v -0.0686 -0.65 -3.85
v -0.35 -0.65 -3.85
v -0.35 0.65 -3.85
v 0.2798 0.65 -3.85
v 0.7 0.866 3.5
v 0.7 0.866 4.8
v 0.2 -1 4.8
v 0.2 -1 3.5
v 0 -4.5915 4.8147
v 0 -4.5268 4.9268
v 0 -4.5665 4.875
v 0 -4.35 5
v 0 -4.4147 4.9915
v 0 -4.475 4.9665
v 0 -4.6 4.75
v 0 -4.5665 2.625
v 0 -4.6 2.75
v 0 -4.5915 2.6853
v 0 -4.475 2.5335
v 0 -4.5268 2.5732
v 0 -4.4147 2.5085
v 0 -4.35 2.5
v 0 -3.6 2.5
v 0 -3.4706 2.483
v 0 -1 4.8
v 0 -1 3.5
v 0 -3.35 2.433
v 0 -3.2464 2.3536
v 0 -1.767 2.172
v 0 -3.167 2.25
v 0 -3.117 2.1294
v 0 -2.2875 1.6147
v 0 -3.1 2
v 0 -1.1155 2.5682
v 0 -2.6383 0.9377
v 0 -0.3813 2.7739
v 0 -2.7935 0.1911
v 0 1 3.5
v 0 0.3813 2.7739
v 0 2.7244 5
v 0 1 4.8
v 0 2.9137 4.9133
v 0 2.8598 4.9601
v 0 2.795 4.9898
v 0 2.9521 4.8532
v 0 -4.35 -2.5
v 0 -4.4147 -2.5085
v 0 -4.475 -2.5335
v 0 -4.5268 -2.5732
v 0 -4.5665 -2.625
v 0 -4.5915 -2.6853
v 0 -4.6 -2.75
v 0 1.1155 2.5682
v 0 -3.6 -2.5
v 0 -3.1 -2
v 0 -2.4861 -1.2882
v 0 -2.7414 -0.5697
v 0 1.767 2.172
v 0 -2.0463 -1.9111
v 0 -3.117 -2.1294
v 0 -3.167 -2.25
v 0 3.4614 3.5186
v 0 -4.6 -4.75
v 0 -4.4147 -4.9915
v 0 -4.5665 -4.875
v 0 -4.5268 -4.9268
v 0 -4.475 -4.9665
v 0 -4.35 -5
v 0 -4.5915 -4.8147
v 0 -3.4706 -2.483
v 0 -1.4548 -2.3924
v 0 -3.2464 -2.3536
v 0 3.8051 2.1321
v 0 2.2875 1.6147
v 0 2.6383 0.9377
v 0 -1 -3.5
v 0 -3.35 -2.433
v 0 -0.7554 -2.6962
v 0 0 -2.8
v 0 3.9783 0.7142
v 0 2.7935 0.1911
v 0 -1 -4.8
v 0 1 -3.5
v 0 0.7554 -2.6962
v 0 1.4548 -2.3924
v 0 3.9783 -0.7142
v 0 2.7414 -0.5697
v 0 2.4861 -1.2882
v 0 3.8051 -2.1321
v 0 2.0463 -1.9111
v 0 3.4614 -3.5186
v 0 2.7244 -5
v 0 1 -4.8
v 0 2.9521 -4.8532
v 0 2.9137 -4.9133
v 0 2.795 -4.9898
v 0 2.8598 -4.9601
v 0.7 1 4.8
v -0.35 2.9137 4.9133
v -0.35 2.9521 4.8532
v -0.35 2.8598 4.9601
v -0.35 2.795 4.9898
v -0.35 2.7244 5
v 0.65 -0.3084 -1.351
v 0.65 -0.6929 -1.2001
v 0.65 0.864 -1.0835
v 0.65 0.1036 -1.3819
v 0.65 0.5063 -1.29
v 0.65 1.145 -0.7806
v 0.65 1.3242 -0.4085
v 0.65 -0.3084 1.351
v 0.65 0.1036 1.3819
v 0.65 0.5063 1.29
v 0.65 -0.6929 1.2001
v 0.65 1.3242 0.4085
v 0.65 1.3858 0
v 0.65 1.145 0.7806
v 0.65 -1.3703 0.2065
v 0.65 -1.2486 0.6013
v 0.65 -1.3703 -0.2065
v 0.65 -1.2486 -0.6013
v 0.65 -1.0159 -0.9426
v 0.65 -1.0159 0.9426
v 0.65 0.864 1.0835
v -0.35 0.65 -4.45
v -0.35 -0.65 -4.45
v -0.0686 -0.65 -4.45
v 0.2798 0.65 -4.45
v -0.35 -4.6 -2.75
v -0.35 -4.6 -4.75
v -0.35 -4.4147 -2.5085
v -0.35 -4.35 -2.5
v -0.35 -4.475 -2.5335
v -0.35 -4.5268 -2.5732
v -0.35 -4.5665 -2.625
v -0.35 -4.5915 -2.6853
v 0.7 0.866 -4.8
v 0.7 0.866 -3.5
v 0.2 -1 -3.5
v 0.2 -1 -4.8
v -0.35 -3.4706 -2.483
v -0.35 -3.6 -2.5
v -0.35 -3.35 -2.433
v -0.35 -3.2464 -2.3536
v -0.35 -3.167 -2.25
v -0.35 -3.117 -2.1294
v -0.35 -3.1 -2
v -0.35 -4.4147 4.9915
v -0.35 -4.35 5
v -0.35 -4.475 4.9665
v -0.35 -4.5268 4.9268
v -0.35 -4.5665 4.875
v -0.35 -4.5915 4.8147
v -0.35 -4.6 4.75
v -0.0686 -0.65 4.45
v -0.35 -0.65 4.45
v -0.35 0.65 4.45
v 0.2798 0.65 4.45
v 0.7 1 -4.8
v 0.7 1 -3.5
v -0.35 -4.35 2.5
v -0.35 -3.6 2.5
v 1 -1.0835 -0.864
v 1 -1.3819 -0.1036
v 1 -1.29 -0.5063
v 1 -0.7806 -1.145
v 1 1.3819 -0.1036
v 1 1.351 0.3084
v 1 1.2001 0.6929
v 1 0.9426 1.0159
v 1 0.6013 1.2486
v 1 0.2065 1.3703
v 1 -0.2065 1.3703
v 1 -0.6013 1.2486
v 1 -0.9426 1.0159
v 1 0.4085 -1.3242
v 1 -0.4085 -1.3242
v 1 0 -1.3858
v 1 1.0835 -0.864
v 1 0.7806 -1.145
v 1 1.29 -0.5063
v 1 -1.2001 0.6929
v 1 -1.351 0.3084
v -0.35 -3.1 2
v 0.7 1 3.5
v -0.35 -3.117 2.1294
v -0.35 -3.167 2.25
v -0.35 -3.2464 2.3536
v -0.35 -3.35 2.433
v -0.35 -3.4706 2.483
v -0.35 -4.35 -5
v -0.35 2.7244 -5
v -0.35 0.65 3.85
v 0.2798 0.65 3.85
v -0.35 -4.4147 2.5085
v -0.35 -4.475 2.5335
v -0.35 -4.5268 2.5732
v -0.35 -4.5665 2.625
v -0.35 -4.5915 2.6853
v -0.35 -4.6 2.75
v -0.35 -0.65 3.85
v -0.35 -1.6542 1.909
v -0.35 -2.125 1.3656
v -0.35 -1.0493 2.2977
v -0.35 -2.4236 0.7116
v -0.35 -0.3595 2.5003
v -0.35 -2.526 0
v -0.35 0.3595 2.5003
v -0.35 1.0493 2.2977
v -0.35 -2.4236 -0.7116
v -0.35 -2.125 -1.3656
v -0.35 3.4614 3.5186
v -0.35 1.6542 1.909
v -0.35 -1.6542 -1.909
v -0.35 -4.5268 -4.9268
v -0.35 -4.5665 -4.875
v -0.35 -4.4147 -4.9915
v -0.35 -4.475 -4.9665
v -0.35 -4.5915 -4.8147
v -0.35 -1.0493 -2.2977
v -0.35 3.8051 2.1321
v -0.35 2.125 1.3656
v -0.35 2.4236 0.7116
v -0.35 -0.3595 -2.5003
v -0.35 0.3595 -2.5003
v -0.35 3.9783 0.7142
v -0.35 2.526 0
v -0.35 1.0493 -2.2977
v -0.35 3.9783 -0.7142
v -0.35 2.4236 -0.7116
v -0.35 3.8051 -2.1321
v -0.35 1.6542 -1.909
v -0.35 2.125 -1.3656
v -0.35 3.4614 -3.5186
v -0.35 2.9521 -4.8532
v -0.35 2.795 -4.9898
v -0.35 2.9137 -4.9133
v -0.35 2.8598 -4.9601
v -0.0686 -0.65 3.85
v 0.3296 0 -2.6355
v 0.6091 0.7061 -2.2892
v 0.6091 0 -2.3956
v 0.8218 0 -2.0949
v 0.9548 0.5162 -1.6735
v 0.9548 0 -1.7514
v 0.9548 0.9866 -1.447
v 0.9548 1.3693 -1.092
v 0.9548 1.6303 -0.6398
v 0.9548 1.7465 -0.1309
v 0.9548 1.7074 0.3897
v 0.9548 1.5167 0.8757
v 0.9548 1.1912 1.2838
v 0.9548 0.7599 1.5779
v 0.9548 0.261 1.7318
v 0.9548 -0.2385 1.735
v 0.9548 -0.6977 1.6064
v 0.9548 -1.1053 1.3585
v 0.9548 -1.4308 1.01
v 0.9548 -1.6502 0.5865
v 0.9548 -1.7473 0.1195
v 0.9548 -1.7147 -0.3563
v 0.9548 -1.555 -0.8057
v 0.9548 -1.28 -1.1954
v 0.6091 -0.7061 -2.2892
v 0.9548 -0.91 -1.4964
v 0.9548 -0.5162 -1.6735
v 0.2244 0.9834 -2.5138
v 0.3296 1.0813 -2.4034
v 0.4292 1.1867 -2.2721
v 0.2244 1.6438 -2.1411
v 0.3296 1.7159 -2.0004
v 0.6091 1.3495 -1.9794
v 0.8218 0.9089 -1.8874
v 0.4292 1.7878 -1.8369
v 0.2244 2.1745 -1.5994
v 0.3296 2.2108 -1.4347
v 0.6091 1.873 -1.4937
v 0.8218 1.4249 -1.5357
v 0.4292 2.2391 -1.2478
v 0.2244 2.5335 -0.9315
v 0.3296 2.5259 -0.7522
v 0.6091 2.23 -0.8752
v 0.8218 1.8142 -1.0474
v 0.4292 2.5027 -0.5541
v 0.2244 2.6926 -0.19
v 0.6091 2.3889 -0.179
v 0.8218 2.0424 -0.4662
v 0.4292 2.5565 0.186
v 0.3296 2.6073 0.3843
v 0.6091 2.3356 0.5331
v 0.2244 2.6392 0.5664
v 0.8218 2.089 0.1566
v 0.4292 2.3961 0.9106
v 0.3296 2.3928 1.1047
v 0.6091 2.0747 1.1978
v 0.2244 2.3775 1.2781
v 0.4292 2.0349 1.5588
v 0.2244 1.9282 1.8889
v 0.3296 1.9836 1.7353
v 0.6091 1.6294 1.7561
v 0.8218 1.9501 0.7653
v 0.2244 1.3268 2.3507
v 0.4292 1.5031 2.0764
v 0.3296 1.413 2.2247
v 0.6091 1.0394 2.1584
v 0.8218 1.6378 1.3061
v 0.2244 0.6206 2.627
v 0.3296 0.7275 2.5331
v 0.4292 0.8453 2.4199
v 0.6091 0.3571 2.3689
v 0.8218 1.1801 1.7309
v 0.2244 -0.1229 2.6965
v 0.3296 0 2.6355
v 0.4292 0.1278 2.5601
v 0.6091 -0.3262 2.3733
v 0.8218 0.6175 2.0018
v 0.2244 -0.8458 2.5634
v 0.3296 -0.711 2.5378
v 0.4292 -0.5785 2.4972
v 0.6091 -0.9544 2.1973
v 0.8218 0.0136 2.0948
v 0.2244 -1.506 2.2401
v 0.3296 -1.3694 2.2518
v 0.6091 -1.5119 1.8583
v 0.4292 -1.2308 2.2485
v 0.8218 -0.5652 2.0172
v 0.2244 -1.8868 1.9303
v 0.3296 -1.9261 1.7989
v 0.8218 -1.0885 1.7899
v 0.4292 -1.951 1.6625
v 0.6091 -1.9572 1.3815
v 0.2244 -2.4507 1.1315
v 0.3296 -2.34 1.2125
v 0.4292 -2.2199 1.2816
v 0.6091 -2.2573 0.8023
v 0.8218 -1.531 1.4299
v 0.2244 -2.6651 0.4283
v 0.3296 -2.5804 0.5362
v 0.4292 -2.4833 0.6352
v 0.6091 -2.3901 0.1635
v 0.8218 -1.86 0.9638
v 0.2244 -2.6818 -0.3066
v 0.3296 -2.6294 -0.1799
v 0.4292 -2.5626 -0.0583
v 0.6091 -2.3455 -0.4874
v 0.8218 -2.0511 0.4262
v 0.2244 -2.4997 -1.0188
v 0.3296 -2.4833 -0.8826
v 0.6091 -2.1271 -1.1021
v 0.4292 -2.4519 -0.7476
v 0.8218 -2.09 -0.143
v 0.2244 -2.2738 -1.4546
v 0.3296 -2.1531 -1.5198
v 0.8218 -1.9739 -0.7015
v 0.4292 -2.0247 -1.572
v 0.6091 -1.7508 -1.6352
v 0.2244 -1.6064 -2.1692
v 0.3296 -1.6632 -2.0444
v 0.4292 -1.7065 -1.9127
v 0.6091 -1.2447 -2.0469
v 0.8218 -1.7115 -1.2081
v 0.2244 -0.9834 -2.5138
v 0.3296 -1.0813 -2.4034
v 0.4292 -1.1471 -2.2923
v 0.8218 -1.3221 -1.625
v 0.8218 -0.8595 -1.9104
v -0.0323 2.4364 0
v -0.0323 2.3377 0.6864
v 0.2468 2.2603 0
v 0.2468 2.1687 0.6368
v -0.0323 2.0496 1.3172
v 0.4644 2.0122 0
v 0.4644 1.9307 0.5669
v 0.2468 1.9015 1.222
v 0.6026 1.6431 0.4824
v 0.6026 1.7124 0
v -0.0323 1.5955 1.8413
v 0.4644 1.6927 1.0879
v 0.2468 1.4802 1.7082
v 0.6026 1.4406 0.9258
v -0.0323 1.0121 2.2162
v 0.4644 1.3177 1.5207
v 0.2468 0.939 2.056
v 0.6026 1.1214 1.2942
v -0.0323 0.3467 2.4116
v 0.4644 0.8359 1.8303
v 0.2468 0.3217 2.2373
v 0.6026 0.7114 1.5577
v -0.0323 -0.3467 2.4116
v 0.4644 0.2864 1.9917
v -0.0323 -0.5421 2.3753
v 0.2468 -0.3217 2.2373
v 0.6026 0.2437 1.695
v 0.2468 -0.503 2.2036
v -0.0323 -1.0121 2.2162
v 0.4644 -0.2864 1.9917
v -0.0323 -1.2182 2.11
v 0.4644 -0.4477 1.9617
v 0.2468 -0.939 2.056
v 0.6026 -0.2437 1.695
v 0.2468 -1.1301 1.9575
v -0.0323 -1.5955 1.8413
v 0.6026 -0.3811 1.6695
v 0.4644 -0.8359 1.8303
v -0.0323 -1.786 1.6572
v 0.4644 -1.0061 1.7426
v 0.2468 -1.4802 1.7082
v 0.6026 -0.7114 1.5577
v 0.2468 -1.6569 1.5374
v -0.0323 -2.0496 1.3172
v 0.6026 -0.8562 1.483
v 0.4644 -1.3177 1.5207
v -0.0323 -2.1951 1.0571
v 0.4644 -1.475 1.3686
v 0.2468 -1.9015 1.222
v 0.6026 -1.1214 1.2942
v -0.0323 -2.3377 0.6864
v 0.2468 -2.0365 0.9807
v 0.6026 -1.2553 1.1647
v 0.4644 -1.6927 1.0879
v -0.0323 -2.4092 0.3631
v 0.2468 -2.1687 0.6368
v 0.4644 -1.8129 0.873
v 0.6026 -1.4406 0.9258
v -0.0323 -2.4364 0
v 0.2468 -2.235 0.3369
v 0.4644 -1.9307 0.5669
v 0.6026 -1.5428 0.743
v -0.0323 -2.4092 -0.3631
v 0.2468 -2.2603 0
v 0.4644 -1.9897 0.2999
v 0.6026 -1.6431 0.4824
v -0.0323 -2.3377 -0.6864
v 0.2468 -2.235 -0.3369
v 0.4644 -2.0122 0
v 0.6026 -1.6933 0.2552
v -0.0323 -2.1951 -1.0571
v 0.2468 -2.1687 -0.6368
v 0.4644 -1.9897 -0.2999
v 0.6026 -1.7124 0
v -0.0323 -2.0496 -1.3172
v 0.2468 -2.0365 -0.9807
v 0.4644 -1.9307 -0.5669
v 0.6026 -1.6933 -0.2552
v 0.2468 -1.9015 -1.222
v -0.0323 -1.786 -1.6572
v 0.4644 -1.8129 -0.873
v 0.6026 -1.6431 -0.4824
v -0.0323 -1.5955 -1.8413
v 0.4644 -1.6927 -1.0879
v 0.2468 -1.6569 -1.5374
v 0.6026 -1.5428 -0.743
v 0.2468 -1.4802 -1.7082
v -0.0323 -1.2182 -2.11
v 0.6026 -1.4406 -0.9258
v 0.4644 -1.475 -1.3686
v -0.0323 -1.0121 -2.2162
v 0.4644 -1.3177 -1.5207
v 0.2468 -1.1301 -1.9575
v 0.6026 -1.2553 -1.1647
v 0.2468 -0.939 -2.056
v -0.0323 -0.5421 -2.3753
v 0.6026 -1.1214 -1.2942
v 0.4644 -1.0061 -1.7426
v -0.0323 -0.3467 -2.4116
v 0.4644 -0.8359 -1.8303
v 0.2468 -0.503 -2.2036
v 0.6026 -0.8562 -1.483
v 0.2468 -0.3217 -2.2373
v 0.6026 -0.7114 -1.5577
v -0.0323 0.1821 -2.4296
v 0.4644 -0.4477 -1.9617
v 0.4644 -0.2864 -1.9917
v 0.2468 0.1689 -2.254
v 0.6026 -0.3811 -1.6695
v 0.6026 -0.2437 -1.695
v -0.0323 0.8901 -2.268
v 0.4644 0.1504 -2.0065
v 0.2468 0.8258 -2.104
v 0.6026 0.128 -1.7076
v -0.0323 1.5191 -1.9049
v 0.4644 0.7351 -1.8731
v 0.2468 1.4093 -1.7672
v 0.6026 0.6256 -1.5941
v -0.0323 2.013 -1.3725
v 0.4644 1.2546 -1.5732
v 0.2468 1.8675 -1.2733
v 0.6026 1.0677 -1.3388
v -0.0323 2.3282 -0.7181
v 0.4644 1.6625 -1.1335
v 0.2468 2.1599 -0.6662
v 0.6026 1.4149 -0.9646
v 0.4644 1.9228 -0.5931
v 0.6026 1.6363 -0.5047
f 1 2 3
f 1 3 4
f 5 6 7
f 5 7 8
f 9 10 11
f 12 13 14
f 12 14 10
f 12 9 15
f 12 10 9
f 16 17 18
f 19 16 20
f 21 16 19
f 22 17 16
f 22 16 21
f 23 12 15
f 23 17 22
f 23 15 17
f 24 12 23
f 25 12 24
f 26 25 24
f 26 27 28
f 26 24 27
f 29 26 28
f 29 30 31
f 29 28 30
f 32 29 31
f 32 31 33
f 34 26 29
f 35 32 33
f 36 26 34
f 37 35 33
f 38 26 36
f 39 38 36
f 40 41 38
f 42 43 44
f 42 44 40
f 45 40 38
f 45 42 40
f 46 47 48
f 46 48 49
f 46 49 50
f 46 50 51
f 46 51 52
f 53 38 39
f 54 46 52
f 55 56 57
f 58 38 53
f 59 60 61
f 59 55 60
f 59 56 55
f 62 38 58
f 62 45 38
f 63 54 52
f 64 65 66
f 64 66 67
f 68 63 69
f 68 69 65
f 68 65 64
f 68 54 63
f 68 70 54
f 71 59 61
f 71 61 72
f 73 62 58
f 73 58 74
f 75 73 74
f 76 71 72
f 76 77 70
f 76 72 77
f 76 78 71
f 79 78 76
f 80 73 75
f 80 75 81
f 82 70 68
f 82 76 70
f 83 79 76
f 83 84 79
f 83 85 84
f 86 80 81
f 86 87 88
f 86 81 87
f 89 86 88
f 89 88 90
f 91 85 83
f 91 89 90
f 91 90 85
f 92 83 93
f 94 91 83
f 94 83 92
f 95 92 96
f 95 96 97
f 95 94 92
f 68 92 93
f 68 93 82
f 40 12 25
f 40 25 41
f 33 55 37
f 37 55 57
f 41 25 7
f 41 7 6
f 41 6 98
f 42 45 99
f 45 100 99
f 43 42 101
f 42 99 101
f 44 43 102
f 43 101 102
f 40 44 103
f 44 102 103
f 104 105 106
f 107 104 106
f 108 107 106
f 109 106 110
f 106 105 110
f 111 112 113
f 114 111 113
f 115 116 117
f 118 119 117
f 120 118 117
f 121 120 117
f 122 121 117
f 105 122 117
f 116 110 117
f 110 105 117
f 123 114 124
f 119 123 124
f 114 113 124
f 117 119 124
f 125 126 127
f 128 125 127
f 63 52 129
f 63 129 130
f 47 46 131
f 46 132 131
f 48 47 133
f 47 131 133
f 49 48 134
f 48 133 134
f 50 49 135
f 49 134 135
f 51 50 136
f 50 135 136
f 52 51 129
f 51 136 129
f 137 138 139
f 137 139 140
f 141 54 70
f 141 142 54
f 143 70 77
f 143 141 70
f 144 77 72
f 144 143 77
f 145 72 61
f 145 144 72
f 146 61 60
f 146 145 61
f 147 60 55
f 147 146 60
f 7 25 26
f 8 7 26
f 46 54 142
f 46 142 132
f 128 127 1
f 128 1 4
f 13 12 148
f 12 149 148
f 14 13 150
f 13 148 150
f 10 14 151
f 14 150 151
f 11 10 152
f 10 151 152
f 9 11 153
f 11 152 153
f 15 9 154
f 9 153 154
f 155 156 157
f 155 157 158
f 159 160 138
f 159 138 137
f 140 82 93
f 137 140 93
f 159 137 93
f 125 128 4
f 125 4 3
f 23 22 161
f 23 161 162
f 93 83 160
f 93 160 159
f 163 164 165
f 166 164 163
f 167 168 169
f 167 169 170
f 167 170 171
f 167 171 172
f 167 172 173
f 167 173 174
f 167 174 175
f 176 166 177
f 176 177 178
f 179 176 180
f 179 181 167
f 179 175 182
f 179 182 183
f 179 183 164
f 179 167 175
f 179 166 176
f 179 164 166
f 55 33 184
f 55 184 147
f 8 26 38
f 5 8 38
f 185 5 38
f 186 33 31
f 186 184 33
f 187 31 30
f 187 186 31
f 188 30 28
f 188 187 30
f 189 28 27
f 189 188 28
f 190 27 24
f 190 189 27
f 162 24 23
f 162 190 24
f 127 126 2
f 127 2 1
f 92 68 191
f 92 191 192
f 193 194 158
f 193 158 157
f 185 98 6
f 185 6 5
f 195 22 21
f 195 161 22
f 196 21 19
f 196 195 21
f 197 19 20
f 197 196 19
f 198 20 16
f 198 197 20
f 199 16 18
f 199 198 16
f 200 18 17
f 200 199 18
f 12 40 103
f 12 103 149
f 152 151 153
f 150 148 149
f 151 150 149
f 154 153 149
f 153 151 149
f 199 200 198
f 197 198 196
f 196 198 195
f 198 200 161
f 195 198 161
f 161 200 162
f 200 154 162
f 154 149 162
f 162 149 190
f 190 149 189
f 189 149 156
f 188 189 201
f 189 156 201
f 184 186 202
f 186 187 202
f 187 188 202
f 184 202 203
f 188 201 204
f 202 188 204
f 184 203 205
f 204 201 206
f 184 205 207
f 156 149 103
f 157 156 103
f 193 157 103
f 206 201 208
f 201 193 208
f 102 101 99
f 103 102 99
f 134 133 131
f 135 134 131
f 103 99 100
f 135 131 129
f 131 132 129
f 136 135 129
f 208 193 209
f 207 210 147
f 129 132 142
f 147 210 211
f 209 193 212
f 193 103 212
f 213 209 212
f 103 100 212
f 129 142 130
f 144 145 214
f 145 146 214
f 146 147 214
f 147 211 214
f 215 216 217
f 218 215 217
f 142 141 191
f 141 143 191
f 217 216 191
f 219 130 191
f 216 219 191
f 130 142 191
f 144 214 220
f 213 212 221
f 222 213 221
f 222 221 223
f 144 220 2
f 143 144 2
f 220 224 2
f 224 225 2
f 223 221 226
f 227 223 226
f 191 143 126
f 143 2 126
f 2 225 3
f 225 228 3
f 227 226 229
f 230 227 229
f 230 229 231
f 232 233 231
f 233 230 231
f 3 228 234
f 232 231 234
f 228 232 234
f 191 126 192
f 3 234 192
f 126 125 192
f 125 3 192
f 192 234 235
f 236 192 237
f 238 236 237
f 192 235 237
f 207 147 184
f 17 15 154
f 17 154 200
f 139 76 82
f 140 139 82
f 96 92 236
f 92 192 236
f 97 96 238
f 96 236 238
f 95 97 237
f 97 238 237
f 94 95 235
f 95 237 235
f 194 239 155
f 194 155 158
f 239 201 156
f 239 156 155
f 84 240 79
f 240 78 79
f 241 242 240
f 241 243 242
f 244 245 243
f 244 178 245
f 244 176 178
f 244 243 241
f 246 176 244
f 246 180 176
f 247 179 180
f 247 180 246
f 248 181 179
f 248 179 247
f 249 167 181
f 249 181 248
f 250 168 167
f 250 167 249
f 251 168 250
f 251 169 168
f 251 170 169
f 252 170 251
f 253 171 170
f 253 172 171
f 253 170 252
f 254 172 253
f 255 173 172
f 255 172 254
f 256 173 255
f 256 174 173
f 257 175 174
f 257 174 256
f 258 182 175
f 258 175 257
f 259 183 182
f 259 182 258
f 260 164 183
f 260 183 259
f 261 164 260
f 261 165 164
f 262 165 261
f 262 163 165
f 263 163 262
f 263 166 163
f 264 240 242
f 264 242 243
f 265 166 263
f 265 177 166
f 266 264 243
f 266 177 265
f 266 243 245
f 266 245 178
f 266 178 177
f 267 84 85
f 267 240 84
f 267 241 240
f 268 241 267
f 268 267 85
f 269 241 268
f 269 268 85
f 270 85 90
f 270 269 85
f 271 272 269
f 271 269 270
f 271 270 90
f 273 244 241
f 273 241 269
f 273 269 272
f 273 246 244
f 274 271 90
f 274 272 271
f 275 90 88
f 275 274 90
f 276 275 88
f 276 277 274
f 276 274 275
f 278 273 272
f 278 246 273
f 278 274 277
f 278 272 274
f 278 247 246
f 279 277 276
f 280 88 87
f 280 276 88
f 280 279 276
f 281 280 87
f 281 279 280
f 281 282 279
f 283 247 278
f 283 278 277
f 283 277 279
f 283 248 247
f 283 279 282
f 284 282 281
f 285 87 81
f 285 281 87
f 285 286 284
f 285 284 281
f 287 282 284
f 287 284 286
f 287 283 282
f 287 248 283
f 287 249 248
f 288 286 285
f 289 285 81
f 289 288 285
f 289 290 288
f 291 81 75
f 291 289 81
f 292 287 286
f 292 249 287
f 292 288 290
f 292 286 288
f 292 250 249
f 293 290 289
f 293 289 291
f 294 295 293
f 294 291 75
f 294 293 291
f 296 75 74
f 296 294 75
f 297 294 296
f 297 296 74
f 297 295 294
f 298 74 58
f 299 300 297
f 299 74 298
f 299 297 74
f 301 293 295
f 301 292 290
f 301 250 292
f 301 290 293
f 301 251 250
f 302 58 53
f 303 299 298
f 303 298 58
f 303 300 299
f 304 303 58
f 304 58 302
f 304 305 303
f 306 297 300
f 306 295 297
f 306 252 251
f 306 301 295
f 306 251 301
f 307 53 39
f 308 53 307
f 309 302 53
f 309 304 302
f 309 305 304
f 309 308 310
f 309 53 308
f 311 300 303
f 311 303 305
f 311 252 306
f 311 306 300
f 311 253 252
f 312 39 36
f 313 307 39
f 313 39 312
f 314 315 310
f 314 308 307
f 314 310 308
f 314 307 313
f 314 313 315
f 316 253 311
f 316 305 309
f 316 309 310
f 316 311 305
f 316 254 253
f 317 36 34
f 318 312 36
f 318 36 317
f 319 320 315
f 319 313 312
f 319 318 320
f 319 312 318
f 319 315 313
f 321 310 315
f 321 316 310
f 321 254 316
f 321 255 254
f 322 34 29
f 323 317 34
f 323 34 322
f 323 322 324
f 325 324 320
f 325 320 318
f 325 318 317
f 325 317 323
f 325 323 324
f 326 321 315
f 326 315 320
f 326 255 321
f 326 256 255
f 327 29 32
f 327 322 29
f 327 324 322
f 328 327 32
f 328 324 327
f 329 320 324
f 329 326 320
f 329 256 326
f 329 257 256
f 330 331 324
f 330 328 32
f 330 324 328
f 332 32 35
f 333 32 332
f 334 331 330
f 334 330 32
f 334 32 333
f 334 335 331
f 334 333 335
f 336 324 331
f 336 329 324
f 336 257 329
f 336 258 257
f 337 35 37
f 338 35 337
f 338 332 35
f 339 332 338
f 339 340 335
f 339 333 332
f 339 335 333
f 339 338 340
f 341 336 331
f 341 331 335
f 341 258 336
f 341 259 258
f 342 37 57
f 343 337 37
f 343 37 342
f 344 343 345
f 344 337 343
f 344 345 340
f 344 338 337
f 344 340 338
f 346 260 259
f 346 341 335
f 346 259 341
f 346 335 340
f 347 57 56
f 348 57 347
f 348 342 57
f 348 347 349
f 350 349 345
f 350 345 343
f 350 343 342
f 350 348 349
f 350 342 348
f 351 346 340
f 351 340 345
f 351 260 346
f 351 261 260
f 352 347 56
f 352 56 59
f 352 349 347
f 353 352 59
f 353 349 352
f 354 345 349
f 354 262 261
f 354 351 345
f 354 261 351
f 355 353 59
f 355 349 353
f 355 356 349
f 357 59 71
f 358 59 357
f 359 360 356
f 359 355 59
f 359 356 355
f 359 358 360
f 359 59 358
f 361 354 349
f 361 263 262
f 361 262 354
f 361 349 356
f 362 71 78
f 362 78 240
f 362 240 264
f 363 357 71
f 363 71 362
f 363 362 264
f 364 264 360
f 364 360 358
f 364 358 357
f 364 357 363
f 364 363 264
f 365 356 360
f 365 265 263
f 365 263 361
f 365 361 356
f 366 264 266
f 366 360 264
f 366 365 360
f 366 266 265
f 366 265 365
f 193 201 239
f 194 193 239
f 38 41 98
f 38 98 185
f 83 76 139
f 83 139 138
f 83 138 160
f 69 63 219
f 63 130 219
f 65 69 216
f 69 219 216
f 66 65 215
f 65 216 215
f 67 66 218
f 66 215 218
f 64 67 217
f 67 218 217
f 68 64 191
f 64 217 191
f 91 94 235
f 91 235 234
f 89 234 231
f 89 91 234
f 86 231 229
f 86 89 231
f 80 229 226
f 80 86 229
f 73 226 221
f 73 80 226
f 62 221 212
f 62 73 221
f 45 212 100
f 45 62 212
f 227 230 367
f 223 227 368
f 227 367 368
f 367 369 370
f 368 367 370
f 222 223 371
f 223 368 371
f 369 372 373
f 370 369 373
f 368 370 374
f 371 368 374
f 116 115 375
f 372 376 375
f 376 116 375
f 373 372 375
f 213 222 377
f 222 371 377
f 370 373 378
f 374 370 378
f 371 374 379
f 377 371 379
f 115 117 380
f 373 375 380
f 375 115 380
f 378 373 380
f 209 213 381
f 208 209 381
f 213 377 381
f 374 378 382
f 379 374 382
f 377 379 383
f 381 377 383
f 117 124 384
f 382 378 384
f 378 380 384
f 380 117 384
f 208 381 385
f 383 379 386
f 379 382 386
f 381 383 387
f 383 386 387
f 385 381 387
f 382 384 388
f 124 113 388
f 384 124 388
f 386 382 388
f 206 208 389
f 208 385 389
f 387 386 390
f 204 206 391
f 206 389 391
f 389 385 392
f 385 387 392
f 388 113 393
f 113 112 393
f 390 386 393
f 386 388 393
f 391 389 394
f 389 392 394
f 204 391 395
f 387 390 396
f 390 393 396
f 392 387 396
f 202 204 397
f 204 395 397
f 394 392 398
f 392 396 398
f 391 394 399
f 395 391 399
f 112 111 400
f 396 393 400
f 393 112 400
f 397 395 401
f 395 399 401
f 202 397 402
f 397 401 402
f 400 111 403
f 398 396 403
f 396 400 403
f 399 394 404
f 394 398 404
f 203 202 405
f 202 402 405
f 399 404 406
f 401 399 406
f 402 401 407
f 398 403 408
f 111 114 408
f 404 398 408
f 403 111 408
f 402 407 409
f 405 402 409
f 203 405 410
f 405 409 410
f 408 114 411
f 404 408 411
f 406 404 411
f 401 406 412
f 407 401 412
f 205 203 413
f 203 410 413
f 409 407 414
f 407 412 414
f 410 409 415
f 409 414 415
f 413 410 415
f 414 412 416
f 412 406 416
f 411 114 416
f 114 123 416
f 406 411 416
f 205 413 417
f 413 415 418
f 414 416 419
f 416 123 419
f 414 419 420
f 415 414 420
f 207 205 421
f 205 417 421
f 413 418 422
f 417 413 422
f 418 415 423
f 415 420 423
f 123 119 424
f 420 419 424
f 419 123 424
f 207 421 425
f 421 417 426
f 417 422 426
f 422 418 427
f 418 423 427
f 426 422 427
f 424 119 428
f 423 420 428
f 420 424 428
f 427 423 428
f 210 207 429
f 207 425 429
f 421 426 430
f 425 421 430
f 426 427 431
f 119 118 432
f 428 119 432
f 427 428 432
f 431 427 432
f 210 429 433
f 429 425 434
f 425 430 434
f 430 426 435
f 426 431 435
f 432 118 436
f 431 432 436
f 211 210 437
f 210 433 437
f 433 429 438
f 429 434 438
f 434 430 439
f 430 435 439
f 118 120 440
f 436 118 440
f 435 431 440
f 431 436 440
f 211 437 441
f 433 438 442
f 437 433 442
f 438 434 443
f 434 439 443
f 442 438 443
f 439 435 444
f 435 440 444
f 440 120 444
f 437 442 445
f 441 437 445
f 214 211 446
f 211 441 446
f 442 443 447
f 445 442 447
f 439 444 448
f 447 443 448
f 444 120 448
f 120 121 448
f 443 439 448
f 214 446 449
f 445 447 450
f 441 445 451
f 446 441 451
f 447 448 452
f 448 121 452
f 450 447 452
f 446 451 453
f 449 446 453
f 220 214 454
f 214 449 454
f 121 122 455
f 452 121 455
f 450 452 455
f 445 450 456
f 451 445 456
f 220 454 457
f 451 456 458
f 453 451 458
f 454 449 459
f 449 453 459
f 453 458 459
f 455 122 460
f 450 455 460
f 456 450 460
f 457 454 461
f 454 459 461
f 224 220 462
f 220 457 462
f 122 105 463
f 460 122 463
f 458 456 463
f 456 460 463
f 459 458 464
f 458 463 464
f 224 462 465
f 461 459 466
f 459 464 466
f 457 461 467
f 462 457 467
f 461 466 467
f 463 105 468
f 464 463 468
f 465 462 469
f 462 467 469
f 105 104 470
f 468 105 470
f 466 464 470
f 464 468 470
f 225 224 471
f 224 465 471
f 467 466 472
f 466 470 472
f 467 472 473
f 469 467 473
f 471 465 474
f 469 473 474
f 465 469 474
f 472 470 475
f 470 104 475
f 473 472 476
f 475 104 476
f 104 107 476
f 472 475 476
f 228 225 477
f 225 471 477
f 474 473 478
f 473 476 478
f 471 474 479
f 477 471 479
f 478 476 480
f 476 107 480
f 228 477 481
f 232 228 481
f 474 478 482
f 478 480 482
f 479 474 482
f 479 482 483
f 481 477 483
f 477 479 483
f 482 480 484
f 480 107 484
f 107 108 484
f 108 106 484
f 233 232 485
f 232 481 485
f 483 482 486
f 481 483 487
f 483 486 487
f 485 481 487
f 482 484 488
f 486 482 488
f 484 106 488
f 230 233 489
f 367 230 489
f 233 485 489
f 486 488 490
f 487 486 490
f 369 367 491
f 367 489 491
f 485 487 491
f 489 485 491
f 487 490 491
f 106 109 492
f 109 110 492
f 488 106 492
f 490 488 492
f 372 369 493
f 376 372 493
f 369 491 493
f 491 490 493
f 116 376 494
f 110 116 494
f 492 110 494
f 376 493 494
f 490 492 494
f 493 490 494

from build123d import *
from OCP.BRepFilletAPI import BRepFilletAPI_MakeChamfer

# Parameters (mm, degrees)
SKETCH1_R           = 2.8
BOSS_EXTRUDE1_DEPTH = 1
BOSS_EXTRUDE2_DEPTH = 0.35
FILLET1_R           = 1.5
SKETCH3_W           = 1.3
SKETCH3_H           = 2
BOSS_EXTRUDE3_DEPTH = 0.7
CHAMFER1_SIZE       = 0.5
CHAMFER1_SIZE2      = 1.866025404
FILLET2_R           = 0.5
FILLET3_R           = 0.25
SHELL3_START        = -4.45
SHELL3_DEPTH        = 0.6
SHELL3_START_2      = 3.85
SHELL3_2_DEPTH      = 0.6


# Read off the part's stored shape, not the designer's step: Shell3
with BuildPart() as part:
    # Sketch1 → Boss-Extrude1 (new body)
    with BuildSketch(Plane(origin=(0, 0, 0), x_dir=(0, 0, -1), z_dir=(1, 0, 0))):
        Circle(SKETCH1_R)
    extrude(amount=BOSS_EXTRUDE1_DEPTH)

    # Sketch2 → Boss-Extrude2 (add)
    with BuildSketch(Plane(origin=(0, 0, 0), x_dir=(0, 0, -1), z_dir=(1, 0, 0))):
        with BuildLine():
            Line((2.5, -4.6), (5, -4.6))
            Line((5, -4.6), (5, 2.495381949))
            Line((5, 2.495381949), (5, 2.884339454))
            ThreePointArc((5, 2.884339454), (0, 4), (-5, 2.884339454))
            Line((-5, 2.884339454), (-5, 2.495381949))
            Line((-5, 2.495381949), (-5, -4.6))
            Line((-5, -4.6), (-2.5, -4.6))
            Line((-2.5, -4.6), (-2.5, -3.1))
            Line((-2.5, -3.1), (2.5, -3.1))
            Line((2.5, -3.1), (2.5, -4.6))
        make_face()
    extrude(amount=-BOSS_EXTRUDE2_DEPTH)

    # Fillet1
    # the kernel refuses this fillet: 1.5 mm, written as the material it takes off along each edge
    with BuildSketch(Plane(origin=(1, 0, 0), x_dir=(0, 0, -1), z_dir=(0, -1, 0))) as fillet1_piece_1:
        with BuildLine():
            CenterArc((1.385786438, -1.5), FILLET1_R, 19.471220634, 70.528779366)
            Line((1.385786438, 0), (1.385786438, 0.03))
            Line((1.385786438, 0.03), (2.8, 0.03))
            Line((2.8, 0.03), (2.83, 0))
            ThreePointArc((2.83, 0), (2.83, -0.5), (2.828284271, -0.99))
            Line((2.828284271, -0.99), (2.8, -1))
        make_face()
    revolve(axis=Axis((1, 0, 0), (1, 0, 0)), mode=Mode.SUBTRACT)

    # Sketch3 → Boss-Extrude3 (add)
    with BuildSketch(Plane(origin=(0, 0, 0), x_dir=(0, 0, -1), z_dir=(1, 0, 0))):
        with Locations((-4.15, 0)):
            Rectangle(SKETCH3_W, SKETCH3_H)
        with Locations((4.15, 0)):
            Rectangle(SKETCH3_W, SKETCH3_H)
    extrude(amount=BOSS_EXTRUDE3_DEPTH)

    # Chamfer1: one chamfer whose edges measure the first distance from different faces: ONE call of the kernel's chamfer builder (chamfer() names one face for all edges)
    chamfer1_edges_1 = [part.edges().sort_by_distance(p)[0] for p in [
        (0.7, -1, 4.15),
    ]]
    chamfer1_side_1 = [part.faces().sort_by_distance(p)[0] for p in [
        (0.35, -1, 4.15),
    ]]
    chamfer1_edges_2 = [part.edges().sort_by_distance(p)[0] for p in [
        (0.7, -1, -4.15),
    ]]
    chamfer1_side_2 = [part.faces().sort_by_distance(p)[0] for p in [
        (0.35, -1, -4.15),
    ]]
    chamfer1 = BRepFilletAPI_MakeChamfer(part.part.solid().wrapped)
    for e in chamfer1_edges_1:
        chamfer1.Add(CHAMFER1_SIZE, CHAMFER1_SIZE2, e.wrapped, chamfer1_side_1[0].wrapped)  # the first distance lies on this face
    for e in chamfer1_edges_2:
        chamfer1.Add(CHAMFER1_SIZE, CHAMFER1_SIZE2, e.wrapped, chamfer1_side_2[0].wrapped)  # the first distance lies on this face
    add(Compound.cast(chamfer1.Shape()), mode=Mode.REPLACE)

    # Fillet2
    fillet2_edges = [part.edges().sort_by_distance(p)[0] for p in [
        (-0.175, -3.1, 2.5),
        (-0.175, -3.1, -2.5),
    ]]
    fillet(fillet2_edges, radius=FILLET2_R)

    # Fillet3
    fillet3_edges = [part.edges().sort_by_distance(p)[0] for p in [
        (-0.175, -4.6, 2.5),
        (-0.175, -4.6, 5),
        (-0.175, 2.884339454, 5),
        (-0.175, 2.884339454, -5),
        (-0.175, -4.6, -5),
        (-0.175, -4.6, -2.5),
    ]]
    fillet(fillet3_edges, radius=FILLET3_R)

    # Shell3 outline → Shell3 (cut)
    with BuildSketch(Plane.XY.offset(SHELL3_START)):
        Polygon((-0.35, -0.65), (-0.068564446, -0.65), (0.279769504, 0.65), (-0.35, 0.65), align=None)
    extrude(amount=SHELL3_DEPTH, mode=Mode.SUBTRACT)

    # Shell3 2 outline → Shell3 2 (cut)
    with BuildSketch(Plane.XY.offset(SHELL3_START_2)):
        Polygon((-0.35, -0.65), (-0.068564446, -0.65), (0.279769504, 0.65), (-0.35, 0.65), align=None)
    extrude(amount=SHELL3_2_DEPTH, mode=Mode.SUBTRACT)

    # Shell3 3 outline → Shell3 3 (revolve, cut)
    with BuildSketch(Plane.YX):
        with BuildLine():
            ThreePointArc((2.525961863, -0.35), (2.144073982, 0.364580823), (1.385786438, 0.65))
            Line((1.385786438, 0.65), (0, 0.65))
            Line((0, 0.65), (0, -0.35))
            Line((0, -0.35), (2.525961863, -0.35))
        make_face()
    revolve(axis=Axis((0, 0, 0), (1, 0, 0)), mode=Mode.SUBTRACT)


solid = part.part
